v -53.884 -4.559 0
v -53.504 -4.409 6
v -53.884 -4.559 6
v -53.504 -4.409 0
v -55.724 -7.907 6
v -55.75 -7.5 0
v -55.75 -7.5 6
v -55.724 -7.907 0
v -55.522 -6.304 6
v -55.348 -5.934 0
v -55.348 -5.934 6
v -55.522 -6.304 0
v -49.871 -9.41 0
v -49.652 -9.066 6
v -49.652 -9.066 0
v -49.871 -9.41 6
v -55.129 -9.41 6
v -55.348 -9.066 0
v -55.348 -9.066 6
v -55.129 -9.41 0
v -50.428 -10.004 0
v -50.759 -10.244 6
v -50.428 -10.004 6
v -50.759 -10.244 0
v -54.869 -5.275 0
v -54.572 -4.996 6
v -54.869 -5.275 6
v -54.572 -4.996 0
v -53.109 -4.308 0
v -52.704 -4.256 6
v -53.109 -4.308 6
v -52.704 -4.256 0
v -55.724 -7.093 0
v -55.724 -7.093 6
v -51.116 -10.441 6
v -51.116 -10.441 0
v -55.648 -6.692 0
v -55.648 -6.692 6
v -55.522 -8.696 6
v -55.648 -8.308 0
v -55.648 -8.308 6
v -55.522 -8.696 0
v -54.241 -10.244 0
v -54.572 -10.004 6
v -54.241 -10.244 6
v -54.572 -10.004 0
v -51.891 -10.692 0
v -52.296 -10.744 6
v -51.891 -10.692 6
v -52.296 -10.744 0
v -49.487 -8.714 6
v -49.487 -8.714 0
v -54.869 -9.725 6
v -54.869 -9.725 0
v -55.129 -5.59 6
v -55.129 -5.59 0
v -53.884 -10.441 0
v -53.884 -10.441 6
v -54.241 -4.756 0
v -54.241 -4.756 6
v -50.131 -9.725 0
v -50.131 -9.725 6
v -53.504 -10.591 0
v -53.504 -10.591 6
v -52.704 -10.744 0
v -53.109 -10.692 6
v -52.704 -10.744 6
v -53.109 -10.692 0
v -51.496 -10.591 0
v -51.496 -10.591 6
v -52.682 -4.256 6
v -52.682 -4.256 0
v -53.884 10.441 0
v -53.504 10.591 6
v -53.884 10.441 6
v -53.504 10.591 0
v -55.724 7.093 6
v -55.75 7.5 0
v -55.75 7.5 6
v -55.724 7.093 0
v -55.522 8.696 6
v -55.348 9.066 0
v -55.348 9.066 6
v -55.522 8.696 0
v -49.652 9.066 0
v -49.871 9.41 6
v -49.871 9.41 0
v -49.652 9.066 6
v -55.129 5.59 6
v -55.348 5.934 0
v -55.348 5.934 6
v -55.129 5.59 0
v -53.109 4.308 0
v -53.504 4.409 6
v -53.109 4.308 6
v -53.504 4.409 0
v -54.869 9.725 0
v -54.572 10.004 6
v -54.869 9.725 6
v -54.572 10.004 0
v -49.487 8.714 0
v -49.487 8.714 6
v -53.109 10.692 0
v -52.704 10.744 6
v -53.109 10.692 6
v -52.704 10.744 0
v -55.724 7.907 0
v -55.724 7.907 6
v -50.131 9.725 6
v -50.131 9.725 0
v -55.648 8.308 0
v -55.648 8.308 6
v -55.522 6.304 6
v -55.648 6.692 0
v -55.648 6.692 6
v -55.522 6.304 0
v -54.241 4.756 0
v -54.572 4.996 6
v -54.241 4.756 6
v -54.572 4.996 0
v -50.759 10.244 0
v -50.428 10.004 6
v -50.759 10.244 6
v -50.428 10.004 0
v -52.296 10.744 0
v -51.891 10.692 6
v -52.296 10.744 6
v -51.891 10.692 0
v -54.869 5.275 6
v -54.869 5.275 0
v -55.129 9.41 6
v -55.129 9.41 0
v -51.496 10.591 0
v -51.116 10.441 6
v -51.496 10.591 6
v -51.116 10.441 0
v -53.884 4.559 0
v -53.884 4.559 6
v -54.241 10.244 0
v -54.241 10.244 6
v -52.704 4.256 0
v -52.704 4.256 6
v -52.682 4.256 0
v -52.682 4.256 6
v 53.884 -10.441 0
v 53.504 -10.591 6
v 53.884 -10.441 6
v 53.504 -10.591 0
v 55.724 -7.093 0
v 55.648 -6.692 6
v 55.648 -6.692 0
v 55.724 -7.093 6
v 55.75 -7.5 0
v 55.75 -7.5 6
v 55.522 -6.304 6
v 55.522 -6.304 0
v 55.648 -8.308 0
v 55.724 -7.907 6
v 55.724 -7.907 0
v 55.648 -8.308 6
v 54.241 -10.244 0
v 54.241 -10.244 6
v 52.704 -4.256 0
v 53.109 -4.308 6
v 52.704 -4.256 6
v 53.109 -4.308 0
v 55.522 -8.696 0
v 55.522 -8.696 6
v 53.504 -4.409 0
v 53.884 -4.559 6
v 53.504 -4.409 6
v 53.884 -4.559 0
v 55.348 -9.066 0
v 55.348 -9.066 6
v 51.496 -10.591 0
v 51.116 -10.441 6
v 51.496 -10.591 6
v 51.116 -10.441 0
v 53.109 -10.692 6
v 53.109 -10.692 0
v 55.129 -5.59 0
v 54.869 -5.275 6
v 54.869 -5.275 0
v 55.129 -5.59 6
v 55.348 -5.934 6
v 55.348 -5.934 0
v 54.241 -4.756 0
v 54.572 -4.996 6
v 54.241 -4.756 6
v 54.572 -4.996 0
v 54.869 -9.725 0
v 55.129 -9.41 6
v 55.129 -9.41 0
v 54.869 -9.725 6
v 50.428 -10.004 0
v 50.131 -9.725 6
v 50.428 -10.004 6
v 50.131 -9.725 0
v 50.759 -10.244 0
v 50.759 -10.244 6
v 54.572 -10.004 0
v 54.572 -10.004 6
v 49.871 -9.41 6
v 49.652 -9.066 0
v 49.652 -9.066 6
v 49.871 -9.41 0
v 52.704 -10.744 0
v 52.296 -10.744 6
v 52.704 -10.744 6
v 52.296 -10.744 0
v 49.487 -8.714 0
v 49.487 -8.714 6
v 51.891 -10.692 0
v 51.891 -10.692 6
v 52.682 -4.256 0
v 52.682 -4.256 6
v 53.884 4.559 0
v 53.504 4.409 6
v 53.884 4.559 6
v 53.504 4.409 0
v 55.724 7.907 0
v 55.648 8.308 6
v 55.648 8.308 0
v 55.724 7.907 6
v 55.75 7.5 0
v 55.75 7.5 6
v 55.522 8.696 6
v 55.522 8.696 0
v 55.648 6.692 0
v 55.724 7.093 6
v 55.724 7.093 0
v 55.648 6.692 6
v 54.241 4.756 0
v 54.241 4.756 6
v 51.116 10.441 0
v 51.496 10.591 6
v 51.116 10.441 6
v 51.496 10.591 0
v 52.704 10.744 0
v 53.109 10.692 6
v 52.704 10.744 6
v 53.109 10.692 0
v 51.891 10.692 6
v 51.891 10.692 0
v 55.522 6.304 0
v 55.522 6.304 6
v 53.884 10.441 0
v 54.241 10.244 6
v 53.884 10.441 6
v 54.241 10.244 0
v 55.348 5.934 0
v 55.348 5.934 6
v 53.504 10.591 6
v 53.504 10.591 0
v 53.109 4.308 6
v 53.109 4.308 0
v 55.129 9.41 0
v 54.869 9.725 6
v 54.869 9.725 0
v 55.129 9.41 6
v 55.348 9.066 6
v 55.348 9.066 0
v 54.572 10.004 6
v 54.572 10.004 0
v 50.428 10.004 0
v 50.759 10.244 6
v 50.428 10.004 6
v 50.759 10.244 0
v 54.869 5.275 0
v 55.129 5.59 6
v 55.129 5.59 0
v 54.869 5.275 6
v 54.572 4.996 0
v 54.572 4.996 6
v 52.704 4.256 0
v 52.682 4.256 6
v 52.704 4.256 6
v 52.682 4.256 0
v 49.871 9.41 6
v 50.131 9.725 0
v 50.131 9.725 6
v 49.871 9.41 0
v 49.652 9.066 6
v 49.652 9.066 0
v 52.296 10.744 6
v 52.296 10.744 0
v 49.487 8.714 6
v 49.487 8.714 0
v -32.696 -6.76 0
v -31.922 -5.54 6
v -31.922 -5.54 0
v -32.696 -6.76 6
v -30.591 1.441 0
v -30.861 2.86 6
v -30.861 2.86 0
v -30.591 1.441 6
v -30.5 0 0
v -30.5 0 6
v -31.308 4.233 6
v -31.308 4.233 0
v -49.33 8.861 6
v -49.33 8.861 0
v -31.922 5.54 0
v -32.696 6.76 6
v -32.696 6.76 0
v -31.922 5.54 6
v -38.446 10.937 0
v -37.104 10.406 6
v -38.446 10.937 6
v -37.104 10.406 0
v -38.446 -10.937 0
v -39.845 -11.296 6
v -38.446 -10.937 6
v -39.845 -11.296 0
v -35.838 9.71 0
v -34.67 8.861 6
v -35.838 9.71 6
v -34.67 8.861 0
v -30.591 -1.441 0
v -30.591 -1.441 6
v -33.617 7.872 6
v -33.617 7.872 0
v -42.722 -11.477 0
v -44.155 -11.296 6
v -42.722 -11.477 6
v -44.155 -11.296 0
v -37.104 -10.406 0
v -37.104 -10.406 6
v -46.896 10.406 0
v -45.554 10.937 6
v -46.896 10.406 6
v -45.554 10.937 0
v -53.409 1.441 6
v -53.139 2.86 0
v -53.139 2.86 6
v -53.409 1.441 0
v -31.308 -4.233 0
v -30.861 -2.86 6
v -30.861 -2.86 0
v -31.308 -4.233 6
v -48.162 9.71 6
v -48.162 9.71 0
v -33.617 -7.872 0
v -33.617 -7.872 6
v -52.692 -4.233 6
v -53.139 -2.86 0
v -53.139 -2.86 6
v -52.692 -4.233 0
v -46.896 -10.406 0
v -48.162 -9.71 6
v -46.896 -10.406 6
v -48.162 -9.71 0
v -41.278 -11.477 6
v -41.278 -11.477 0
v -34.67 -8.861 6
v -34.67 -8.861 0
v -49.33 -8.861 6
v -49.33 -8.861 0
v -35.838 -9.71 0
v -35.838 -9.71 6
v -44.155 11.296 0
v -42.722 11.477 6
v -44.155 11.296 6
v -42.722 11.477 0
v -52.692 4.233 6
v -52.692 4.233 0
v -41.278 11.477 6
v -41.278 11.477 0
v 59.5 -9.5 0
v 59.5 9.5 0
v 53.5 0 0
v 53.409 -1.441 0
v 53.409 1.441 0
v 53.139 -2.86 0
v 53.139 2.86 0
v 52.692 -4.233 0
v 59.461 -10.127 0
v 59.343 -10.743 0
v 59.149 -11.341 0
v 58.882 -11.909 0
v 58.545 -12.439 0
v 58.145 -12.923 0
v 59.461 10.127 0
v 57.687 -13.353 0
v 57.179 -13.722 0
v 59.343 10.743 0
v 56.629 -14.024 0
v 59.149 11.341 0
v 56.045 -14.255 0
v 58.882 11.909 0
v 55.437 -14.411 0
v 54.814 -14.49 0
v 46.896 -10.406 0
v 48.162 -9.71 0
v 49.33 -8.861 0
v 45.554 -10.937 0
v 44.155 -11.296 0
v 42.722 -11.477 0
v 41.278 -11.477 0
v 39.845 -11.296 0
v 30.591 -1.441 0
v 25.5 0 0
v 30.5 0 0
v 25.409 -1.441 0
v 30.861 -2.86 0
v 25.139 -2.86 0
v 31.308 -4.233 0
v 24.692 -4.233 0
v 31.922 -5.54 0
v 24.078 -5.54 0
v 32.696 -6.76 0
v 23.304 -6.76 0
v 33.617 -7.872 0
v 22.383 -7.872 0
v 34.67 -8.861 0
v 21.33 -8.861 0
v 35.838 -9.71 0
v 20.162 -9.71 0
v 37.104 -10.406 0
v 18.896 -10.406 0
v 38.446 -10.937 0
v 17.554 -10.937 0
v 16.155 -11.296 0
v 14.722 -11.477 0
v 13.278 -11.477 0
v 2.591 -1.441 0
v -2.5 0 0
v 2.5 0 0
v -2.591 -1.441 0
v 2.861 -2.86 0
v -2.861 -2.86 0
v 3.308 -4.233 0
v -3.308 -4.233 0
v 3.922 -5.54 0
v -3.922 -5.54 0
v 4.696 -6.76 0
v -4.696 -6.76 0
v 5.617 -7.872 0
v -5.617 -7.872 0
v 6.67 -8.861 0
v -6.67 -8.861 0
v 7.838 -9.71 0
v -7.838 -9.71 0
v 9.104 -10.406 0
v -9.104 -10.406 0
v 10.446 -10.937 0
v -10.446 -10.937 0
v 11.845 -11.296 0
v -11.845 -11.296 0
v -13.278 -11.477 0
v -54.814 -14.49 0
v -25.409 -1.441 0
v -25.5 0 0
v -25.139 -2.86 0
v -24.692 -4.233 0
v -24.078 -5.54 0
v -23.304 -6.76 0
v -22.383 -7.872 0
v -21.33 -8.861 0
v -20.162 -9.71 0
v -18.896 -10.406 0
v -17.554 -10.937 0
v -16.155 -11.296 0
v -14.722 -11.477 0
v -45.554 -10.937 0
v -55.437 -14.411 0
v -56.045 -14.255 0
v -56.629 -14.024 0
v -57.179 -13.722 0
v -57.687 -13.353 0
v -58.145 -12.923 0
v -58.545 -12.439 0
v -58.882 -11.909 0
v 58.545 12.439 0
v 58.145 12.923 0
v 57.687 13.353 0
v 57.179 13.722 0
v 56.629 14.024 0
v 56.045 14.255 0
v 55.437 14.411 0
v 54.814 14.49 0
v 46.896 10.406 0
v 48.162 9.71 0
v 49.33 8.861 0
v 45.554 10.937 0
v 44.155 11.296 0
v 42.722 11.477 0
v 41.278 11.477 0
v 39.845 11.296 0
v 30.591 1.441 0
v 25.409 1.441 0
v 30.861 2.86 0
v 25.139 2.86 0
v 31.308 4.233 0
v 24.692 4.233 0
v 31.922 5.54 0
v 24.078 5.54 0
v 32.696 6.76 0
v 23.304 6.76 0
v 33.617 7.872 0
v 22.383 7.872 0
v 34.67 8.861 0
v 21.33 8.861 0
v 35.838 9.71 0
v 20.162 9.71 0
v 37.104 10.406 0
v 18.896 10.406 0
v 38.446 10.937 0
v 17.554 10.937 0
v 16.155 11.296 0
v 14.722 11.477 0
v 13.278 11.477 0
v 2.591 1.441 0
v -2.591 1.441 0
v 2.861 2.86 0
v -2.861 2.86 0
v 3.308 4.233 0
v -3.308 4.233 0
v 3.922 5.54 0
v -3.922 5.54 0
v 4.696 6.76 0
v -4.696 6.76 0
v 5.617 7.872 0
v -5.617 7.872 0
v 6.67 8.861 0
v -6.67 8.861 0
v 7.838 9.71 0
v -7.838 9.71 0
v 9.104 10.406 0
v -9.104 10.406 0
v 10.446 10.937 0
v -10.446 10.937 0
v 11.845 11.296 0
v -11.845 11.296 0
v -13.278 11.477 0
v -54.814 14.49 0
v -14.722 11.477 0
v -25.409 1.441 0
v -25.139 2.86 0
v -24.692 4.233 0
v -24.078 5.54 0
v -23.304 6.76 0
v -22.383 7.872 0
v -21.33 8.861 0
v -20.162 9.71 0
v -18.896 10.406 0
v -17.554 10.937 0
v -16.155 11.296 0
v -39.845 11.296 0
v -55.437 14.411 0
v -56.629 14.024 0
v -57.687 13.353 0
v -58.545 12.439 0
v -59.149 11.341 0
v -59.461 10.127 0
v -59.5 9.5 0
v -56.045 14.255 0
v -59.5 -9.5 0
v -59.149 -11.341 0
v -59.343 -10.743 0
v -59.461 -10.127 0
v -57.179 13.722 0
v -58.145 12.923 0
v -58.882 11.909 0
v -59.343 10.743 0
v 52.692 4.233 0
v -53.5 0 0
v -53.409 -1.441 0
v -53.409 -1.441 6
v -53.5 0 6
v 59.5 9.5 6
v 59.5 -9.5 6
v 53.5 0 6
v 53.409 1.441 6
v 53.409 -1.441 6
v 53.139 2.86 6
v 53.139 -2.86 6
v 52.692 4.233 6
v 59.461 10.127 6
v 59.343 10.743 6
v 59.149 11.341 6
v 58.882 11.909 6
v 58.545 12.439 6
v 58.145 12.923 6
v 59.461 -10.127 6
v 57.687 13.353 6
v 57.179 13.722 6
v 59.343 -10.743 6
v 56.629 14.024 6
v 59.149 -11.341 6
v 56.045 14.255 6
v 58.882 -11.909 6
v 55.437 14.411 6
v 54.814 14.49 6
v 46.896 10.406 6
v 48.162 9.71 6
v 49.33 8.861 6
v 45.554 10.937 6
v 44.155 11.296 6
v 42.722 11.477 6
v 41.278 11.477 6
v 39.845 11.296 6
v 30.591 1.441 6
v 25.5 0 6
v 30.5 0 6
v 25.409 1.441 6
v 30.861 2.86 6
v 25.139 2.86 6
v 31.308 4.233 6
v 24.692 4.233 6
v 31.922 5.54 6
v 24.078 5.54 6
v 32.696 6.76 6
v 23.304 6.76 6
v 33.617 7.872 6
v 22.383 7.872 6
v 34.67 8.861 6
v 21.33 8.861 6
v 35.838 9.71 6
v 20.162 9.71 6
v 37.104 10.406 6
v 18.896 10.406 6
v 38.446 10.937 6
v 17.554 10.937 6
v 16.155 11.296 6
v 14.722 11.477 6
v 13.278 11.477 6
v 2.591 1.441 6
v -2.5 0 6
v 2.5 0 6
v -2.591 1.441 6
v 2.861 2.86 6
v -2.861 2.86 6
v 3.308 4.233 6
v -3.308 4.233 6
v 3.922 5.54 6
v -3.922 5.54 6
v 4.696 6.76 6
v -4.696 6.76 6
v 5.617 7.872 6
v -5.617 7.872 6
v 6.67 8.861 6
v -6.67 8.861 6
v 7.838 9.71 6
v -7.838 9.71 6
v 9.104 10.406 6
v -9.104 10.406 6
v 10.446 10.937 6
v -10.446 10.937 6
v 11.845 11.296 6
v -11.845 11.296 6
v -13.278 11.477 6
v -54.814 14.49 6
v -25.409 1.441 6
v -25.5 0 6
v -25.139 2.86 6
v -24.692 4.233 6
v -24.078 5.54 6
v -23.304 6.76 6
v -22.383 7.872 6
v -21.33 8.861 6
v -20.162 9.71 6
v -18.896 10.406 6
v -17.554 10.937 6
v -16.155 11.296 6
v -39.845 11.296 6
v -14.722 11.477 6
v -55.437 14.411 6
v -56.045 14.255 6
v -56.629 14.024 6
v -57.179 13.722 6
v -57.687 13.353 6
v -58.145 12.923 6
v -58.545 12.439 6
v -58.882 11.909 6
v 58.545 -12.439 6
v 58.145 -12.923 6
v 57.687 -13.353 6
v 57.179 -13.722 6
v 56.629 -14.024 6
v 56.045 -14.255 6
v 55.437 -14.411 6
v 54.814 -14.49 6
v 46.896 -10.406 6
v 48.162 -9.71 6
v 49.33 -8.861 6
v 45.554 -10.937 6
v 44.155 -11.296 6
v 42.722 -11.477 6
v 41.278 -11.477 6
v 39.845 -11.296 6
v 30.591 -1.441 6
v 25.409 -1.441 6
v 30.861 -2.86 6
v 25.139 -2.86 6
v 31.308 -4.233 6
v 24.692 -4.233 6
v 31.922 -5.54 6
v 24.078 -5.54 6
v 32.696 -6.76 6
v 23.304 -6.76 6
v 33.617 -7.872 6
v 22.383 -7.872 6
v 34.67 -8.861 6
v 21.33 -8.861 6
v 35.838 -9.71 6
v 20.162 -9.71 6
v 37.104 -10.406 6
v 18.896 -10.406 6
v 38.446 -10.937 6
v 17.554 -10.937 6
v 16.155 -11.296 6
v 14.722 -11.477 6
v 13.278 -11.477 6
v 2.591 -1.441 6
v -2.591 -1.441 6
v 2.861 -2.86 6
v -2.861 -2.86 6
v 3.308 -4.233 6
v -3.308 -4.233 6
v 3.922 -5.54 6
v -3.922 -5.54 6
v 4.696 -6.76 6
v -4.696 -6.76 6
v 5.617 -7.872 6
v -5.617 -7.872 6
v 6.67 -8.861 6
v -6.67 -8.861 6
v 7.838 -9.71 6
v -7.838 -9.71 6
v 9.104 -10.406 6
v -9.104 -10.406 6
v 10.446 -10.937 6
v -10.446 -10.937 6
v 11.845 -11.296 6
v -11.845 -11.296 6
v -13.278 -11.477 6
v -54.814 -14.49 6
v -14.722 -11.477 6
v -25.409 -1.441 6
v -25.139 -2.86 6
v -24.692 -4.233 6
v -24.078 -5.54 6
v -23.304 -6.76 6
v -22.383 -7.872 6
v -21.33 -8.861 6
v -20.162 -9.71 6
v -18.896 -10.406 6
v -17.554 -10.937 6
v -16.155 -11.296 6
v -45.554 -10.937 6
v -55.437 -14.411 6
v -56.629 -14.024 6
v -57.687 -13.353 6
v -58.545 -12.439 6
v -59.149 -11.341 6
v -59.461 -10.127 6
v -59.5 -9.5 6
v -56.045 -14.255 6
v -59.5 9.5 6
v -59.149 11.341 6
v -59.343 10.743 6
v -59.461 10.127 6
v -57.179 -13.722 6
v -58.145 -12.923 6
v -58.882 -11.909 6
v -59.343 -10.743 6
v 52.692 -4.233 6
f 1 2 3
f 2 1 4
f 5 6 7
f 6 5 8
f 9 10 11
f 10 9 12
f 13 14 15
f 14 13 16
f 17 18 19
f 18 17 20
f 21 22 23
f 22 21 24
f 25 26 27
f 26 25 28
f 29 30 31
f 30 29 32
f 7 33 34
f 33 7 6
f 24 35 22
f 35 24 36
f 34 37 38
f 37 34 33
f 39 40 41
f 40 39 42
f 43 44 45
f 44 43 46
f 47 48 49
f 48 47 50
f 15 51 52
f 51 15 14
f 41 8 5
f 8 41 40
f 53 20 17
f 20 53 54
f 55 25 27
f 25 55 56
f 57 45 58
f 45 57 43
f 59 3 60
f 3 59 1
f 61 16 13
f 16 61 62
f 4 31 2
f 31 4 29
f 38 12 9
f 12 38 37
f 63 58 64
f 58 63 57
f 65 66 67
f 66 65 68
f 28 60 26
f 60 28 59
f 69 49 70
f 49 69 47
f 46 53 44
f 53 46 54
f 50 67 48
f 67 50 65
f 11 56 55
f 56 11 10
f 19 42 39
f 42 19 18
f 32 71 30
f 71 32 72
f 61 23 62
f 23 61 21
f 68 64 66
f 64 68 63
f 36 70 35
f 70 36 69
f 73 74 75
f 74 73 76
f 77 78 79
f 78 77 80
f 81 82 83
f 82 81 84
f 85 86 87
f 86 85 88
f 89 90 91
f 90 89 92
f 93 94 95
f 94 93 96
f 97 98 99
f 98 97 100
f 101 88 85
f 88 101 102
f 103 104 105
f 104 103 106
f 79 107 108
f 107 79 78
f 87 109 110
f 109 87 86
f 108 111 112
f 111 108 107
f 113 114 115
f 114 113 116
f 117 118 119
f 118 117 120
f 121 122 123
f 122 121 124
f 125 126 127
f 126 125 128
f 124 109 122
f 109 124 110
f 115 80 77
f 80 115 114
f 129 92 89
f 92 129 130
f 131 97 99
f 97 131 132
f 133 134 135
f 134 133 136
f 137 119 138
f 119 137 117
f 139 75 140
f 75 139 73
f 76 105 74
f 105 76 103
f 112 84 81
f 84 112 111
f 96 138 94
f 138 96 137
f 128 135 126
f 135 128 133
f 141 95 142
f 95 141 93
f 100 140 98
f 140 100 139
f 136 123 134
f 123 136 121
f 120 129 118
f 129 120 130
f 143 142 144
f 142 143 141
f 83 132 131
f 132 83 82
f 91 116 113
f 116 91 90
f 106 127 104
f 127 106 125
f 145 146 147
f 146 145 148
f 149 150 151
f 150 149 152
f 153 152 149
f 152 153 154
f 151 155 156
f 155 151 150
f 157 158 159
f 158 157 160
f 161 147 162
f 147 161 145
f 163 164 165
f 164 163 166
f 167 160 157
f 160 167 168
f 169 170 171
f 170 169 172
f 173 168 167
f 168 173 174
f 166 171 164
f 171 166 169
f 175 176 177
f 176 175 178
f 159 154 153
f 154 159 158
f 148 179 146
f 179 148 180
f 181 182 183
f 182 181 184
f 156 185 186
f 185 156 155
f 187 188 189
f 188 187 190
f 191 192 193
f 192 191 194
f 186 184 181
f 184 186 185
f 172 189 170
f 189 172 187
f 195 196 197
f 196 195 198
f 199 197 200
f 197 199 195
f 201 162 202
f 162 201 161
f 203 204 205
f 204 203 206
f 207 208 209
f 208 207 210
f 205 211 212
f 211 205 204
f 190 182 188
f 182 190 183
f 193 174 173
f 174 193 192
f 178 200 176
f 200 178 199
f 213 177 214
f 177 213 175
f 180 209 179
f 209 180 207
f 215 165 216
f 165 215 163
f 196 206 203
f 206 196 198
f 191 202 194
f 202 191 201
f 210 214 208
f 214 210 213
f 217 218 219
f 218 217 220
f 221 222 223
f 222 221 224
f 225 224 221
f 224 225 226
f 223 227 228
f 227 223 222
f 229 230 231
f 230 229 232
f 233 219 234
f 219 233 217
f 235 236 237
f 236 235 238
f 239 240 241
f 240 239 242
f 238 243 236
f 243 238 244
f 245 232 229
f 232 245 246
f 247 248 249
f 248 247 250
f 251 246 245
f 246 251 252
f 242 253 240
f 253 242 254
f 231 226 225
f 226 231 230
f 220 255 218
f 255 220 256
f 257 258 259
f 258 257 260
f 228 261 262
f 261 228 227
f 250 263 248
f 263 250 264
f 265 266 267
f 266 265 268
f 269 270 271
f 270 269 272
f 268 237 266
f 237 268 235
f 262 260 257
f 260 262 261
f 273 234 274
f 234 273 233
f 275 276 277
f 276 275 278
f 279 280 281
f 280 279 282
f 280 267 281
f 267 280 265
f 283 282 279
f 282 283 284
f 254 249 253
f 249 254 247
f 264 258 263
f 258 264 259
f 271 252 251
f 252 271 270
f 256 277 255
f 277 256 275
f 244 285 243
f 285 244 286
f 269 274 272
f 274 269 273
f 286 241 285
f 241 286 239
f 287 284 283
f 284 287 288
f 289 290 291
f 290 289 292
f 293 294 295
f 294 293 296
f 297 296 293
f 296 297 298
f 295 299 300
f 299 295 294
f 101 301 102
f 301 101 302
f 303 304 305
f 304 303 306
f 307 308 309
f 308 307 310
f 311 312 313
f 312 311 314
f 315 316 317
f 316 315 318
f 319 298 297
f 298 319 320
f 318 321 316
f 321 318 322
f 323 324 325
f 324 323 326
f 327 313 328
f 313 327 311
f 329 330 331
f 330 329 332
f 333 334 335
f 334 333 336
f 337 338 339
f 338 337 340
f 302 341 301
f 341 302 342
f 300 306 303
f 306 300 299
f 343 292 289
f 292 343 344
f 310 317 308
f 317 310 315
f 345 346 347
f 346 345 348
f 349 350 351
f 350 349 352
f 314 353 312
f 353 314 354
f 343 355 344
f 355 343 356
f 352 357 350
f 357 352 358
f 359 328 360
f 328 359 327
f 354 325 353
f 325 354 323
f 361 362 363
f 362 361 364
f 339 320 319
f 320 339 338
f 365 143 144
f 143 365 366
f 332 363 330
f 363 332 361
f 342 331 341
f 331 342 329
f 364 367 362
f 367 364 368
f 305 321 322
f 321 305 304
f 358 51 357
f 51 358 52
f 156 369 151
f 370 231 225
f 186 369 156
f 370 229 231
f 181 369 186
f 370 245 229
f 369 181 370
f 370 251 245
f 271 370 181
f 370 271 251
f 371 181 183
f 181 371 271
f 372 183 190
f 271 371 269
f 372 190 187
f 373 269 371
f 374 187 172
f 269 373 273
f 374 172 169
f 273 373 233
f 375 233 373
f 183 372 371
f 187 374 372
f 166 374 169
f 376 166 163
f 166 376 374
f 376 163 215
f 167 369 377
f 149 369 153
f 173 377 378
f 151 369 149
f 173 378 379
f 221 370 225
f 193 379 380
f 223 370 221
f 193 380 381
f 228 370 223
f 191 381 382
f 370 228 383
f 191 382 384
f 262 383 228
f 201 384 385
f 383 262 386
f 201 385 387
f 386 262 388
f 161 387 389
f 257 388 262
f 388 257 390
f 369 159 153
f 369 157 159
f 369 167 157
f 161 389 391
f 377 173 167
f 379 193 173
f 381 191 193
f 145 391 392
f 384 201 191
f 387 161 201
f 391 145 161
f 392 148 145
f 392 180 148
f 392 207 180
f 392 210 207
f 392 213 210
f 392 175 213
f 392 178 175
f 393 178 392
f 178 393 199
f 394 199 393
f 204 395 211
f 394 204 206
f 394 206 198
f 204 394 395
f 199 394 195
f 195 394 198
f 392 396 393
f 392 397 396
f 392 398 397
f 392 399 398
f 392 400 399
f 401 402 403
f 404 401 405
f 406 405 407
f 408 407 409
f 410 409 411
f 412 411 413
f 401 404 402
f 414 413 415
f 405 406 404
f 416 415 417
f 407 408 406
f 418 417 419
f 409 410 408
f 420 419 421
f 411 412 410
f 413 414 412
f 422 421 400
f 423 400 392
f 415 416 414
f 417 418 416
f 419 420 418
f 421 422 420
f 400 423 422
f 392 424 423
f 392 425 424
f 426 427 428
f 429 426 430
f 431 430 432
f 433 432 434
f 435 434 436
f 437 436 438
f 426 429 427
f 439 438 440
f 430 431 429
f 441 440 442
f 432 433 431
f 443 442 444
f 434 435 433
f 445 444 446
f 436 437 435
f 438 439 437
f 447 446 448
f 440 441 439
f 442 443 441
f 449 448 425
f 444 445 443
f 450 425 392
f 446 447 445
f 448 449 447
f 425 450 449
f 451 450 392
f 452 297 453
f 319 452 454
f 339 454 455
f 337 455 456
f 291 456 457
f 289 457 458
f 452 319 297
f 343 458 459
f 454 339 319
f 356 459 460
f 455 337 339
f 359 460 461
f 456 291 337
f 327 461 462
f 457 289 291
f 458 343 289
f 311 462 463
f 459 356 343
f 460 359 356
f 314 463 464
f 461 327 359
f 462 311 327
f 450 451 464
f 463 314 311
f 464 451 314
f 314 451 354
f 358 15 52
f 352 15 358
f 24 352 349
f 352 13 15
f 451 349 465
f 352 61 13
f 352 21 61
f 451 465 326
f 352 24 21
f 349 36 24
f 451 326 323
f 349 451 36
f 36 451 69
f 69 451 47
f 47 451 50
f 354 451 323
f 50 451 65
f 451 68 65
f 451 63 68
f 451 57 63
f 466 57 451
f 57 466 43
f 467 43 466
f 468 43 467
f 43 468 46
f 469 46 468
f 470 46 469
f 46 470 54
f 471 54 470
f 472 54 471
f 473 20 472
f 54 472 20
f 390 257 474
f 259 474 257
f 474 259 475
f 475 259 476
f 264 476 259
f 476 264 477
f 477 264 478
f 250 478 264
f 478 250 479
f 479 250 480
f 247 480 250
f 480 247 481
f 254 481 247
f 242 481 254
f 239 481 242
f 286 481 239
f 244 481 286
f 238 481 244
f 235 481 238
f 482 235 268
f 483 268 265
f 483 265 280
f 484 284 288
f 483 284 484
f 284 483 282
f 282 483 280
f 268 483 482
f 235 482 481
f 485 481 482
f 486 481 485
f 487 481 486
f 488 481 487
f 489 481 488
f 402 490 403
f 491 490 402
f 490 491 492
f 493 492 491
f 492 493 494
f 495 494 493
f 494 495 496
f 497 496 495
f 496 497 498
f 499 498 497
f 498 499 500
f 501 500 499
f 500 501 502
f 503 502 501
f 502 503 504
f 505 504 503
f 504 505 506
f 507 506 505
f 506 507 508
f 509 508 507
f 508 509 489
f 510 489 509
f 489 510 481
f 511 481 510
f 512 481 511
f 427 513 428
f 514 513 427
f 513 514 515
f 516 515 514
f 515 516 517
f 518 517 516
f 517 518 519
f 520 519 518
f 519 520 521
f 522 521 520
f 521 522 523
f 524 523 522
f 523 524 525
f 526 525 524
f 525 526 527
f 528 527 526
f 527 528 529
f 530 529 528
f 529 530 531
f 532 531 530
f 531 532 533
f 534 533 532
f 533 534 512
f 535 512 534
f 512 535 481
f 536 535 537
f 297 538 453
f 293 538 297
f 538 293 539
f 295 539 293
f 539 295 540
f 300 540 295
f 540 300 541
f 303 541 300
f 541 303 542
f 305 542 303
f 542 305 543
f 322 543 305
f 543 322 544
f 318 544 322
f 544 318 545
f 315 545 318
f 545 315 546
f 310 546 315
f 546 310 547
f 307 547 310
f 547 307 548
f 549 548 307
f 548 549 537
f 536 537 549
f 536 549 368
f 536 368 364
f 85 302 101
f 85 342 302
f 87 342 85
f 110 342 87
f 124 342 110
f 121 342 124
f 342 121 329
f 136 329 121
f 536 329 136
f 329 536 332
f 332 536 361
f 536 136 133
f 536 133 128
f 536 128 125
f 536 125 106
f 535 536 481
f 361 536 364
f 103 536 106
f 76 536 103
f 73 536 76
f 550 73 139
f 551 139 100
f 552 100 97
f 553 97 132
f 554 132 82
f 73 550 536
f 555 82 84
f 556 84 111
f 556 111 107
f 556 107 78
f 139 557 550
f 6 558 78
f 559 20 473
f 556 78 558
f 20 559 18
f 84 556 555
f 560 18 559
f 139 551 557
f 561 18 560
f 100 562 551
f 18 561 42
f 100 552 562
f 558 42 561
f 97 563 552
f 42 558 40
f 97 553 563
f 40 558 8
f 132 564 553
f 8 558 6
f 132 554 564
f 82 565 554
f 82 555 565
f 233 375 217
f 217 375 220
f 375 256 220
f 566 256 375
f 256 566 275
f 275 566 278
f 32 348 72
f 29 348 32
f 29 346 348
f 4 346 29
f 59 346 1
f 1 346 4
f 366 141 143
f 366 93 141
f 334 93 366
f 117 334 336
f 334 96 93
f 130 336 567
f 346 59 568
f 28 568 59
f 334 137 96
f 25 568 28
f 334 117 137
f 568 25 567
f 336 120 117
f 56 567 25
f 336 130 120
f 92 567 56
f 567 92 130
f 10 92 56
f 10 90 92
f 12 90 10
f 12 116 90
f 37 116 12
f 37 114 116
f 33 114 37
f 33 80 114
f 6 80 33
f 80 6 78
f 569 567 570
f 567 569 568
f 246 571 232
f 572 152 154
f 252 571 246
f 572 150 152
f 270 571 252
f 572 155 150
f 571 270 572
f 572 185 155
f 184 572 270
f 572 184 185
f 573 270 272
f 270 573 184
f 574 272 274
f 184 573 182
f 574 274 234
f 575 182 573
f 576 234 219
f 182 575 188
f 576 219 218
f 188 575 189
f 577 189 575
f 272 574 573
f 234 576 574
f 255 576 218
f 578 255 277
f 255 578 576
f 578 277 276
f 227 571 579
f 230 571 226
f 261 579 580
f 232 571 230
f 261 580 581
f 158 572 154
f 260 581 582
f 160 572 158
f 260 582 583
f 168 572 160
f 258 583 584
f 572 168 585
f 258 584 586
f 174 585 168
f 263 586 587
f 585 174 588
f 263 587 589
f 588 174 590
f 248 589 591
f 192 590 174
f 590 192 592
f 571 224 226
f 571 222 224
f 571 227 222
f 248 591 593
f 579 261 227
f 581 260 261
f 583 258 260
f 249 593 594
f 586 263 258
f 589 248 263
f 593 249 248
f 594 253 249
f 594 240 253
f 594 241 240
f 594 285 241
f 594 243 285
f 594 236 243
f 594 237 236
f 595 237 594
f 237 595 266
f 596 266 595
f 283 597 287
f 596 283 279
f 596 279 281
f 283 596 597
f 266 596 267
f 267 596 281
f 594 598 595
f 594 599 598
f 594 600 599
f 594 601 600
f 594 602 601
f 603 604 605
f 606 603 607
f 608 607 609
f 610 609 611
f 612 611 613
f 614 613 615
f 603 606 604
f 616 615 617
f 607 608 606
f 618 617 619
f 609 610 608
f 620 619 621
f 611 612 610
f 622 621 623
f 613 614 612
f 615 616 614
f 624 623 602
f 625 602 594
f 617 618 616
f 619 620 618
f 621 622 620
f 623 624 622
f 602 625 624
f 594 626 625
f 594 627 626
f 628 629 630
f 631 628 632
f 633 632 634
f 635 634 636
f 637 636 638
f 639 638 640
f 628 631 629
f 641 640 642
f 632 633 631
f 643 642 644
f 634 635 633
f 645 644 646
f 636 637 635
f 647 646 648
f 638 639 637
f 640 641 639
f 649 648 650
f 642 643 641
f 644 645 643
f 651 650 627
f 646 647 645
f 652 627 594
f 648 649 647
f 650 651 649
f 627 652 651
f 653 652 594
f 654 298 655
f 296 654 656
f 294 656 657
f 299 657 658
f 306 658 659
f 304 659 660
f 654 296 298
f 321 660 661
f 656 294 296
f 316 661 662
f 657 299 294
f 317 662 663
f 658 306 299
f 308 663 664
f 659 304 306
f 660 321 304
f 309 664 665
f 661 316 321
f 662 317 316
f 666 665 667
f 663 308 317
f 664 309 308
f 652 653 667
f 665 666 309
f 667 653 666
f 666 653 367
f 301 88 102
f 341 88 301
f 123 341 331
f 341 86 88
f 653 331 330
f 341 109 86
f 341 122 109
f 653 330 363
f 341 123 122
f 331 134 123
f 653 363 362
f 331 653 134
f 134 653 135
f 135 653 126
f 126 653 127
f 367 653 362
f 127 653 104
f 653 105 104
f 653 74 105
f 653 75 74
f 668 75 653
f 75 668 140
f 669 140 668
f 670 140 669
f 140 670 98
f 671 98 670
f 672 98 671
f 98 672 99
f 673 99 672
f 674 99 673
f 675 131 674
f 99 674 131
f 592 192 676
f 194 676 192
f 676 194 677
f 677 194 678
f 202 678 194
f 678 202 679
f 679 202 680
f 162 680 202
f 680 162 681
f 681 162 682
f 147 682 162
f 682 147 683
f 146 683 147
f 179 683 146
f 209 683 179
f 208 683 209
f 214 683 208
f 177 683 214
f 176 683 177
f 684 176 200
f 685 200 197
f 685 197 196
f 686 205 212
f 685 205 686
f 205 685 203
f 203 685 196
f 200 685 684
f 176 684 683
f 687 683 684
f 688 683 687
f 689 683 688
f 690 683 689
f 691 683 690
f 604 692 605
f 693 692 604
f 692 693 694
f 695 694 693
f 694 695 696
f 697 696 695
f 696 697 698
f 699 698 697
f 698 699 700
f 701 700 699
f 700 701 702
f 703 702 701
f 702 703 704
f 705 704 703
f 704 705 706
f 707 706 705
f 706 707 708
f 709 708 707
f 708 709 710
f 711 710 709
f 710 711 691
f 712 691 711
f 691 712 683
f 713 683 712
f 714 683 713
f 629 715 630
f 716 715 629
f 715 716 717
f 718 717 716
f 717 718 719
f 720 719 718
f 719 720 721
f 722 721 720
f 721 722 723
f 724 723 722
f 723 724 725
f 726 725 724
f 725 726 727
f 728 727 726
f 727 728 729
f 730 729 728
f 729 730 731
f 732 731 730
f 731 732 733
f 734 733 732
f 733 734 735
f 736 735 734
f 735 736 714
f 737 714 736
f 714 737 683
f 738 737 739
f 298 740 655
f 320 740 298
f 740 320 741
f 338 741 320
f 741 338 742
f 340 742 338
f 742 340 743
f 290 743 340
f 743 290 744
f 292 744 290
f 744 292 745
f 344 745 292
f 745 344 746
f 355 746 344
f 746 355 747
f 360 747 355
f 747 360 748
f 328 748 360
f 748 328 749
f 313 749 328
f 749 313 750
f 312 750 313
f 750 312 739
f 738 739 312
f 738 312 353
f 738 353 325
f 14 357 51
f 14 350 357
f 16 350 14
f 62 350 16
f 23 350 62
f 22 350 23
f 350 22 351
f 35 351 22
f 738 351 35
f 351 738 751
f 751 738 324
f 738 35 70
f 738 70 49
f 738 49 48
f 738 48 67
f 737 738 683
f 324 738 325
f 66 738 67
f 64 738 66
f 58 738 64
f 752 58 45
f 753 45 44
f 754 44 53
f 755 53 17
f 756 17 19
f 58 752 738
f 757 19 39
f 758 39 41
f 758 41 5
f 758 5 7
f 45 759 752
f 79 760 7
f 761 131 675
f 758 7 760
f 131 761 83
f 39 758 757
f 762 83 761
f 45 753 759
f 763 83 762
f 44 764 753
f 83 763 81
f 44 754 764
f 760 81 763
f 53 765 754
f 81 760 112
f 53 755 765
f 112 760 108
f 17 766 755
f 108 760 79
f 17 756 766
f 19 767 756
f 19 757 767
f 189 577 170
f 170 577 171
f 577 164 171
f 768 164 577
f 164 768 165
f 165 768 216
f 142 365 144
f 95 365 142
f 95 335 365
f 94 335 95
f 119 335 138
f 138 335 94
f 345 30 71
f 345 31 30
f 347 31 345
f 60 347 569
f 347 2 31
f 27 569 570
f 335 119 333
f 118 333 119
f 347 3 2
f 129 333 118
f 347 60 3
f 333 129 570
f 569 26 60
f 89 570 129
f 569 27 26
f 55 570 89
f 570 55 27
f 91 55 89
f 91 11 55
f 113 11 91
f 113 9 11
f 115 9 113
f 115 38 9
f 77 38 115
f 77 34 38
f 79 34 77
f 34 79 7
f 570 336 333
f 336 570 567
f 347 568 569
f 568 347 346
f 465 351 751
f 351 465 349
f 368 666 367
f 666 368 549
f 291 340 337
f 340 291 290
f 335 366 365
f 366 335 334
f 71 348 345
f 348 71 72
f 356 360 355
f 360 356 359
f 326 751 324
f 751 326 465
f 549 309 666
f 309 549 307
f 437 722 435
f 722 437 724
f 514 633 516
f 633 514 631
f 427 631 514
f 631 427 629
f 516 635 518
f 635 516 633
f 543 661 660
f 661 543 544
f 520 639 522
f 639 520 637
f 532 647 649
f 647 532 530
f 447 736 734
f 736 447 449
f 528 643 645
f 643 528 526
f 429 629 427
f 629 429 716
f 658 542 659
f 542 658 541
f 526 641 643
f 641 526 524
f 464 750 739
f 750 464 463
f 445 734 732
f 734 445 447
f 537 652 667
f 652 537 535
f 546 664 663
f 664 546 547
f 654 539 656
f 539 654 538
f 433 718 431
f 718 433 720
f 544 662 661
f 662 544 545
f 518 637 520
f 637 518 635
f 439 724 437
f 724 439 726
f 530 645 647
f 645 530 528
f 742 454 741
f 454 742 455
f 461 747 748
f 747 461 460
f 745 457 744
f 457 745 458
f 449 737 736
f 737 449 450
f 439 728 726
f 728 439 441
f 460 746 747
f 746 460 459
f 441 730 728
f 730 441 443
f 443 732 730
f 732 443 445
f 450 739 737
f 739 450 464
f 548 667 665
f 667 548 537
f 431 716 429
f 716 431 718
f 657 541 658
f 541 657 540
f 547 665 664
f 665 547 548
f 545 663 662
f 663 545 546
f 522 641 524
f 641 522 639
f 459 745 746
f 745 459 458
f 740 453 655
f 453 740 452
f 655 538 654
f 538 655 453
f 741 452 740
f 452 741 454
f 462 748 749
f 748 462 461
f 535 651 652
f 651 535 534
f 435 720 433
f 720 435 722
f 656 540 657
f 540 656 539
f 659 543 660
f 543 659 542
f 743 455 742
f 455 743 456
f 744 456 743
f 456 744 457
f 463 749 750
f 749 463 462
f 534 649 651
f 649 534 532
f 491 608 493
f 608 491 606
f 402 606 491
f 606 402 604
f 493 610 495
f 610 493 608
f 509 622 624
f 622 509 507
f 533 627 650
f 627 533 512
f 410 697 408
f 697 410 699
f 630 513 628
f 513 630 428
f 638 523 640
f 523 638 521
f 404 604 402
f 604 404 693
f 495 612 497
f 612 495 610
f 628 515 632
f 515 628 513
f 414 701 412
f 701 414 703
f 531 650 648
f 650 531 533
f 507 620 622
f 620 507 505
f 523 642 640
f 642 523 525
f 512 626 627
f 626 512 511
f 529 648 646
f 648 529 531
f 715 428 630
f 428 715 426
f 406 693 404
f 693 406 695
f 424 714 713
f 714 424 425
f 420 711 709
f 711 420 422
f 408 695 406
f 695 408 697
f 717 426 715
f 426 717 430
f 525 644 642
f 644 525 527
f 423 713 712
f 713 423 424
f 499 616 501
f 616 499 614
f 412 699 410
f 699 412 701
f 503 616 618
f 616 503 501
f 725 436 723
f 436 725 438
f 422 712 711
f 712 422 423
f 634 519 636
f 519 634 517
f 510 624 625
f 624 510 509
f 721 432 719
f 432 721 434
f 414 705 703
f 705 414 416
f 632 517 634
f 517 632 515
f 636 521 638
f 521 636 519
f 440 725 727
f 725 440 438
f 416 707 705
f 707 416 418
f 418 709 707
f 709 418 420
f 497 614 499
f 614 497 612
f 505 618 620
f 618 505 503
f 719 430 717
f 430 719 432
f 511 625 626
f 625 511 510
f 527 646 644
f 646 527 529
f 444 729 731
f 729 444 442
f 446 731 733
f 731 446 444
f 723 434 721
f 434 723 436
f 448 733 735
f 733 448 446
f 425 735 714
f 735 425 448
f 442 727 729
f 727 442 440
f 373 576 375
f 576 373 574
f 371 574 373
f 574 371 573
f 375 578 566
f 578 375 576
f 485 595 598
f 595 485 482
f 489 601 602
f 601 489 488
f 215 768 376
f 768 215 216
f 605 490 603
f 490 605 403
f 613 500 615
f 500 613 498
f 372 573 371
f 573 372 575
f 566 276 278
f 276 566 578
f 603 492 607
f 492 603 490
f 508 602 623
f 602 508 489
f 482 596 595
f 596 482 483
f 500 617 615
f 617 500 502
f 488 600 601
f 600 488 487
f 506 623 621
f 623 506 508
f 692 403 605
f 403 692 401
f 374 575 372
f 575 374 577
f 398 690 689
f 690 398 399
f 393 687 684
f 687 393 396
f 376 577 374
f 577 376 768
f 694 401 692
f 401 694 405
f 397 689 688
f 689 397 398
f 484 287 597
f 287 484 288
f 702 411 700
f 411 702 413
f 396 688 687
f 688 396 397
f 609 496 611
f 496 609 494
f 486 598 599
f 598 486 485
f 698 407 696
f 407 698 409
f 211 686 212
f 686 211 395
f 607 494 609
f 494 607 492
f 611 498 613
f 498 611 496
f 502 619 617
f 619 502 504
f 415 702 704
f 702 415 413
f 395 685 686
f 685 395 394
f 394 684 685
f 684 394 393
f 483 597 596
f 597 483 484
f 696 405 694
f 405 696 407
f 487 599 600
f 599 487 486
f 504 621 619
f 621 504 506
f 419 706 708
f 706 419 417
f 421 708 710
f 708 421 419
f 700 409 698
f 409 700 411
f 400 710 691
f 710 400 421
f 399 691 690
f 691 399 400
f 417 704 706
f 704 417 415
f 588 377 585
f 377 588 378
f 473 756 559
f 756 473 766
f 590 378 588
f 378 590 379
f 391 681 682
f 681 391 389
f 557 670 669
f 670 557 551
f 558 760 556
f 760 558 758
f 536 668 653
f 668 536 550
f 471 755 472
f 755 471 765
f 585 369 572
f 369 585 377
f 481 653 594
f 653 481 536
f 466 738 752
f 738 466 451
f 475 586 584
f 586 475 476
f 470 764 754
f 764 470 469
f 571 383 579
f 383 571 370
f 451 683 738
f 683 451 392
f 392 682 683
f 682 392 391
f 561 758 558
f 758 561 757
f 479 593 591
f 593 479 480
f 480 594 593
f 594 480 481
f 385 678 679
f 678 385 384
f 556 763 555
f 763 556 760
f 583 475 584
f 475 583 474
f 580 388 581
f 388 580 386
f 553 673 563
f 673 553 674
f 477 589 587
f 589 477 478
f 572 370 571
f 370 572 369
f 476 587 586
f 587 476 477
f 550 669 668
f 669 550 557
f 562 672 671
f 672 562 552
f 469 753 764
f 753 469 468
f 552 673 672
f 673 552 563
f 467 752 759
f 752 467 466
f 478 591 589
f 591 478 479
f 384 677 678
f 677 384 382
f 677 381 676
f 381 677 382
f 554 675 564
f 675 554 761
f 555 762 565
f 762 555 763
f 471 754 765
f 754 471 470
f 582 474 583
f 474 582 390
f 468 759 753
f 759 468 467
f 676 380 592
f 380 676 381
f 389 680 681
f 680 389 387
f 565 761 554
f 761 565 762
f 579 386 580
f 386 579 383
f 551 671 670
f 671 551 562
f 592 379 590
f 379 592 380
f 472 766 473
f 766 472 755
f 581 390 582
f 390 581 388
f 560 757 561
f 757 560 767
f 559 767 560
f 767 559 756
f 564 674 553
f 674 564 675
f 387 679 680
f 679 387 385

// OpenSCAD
$fn = 50;

difference() {
	union() {
		hull() {
			translate(v = [-54.5, 9.5, 0]) {
				cylinder(h = 6, r = 5);
			}
			translate(v = [54.5, 9.5, 0]) {
				cylinder(h = 6, r = 5);
			}
			translate(v = [-54.5, -9.5, 0]) {
				cylinder(h = 6, r = 5);
			}
			translate(v = [54.5, -9.5, 0]) {
				cylinder(h = 6, r = 5);
			}
		}
	}
	union() {
		translate(v = [-52.5, -7.5, -100.0]) {
			cylinder(h = 200, r = 3.25);
		}
		translate(v = [-52.5, 7.5, -100.0]) {
			cylinder(h = 200, r = 3.25);
		}
		translate(v = [52.5, -7.5, -100.0]) {
			cylinder(h = 200, r = 3.25);
		}
		translate(v = [52.5, 7.5, -100.0]) {
			cylinder(h = 200, r = 3.25);
		}
		translate(v = [-52.5, -7.5, -100.0]) {
			cylinder(h = 200, r = 1.8);
		}
		translate(v = [-52.5, 7.5, -100.0]) {
			cylinder(h = 200, r = 1.8);
		}
		translate(v = [52.5, -7.5, -100.0]) {
			cylinder(h = 200, r = 1.8);
		}
		translate(v = [52.5, 7.5, -100.0]) {
			cylinder(h = 200, r = 1.8);
		}
		translate(v = [-42.0, 0, 0.0]) {
			cylinder(h = 6, r = 11.5);
		}
		translate(v = [-14.0, 0, 0.0]) {
			cylinder(h = 6, r = 11.5);
		}
		translate(v = [14.0, 0, 0.0]) {
			cylinder(h = 6, r = 11.5);
		}
		translate(v = [42.0, 0, 0.0]) {
			cylinder(h = 6, r = 11.5);
		}
	}
}
